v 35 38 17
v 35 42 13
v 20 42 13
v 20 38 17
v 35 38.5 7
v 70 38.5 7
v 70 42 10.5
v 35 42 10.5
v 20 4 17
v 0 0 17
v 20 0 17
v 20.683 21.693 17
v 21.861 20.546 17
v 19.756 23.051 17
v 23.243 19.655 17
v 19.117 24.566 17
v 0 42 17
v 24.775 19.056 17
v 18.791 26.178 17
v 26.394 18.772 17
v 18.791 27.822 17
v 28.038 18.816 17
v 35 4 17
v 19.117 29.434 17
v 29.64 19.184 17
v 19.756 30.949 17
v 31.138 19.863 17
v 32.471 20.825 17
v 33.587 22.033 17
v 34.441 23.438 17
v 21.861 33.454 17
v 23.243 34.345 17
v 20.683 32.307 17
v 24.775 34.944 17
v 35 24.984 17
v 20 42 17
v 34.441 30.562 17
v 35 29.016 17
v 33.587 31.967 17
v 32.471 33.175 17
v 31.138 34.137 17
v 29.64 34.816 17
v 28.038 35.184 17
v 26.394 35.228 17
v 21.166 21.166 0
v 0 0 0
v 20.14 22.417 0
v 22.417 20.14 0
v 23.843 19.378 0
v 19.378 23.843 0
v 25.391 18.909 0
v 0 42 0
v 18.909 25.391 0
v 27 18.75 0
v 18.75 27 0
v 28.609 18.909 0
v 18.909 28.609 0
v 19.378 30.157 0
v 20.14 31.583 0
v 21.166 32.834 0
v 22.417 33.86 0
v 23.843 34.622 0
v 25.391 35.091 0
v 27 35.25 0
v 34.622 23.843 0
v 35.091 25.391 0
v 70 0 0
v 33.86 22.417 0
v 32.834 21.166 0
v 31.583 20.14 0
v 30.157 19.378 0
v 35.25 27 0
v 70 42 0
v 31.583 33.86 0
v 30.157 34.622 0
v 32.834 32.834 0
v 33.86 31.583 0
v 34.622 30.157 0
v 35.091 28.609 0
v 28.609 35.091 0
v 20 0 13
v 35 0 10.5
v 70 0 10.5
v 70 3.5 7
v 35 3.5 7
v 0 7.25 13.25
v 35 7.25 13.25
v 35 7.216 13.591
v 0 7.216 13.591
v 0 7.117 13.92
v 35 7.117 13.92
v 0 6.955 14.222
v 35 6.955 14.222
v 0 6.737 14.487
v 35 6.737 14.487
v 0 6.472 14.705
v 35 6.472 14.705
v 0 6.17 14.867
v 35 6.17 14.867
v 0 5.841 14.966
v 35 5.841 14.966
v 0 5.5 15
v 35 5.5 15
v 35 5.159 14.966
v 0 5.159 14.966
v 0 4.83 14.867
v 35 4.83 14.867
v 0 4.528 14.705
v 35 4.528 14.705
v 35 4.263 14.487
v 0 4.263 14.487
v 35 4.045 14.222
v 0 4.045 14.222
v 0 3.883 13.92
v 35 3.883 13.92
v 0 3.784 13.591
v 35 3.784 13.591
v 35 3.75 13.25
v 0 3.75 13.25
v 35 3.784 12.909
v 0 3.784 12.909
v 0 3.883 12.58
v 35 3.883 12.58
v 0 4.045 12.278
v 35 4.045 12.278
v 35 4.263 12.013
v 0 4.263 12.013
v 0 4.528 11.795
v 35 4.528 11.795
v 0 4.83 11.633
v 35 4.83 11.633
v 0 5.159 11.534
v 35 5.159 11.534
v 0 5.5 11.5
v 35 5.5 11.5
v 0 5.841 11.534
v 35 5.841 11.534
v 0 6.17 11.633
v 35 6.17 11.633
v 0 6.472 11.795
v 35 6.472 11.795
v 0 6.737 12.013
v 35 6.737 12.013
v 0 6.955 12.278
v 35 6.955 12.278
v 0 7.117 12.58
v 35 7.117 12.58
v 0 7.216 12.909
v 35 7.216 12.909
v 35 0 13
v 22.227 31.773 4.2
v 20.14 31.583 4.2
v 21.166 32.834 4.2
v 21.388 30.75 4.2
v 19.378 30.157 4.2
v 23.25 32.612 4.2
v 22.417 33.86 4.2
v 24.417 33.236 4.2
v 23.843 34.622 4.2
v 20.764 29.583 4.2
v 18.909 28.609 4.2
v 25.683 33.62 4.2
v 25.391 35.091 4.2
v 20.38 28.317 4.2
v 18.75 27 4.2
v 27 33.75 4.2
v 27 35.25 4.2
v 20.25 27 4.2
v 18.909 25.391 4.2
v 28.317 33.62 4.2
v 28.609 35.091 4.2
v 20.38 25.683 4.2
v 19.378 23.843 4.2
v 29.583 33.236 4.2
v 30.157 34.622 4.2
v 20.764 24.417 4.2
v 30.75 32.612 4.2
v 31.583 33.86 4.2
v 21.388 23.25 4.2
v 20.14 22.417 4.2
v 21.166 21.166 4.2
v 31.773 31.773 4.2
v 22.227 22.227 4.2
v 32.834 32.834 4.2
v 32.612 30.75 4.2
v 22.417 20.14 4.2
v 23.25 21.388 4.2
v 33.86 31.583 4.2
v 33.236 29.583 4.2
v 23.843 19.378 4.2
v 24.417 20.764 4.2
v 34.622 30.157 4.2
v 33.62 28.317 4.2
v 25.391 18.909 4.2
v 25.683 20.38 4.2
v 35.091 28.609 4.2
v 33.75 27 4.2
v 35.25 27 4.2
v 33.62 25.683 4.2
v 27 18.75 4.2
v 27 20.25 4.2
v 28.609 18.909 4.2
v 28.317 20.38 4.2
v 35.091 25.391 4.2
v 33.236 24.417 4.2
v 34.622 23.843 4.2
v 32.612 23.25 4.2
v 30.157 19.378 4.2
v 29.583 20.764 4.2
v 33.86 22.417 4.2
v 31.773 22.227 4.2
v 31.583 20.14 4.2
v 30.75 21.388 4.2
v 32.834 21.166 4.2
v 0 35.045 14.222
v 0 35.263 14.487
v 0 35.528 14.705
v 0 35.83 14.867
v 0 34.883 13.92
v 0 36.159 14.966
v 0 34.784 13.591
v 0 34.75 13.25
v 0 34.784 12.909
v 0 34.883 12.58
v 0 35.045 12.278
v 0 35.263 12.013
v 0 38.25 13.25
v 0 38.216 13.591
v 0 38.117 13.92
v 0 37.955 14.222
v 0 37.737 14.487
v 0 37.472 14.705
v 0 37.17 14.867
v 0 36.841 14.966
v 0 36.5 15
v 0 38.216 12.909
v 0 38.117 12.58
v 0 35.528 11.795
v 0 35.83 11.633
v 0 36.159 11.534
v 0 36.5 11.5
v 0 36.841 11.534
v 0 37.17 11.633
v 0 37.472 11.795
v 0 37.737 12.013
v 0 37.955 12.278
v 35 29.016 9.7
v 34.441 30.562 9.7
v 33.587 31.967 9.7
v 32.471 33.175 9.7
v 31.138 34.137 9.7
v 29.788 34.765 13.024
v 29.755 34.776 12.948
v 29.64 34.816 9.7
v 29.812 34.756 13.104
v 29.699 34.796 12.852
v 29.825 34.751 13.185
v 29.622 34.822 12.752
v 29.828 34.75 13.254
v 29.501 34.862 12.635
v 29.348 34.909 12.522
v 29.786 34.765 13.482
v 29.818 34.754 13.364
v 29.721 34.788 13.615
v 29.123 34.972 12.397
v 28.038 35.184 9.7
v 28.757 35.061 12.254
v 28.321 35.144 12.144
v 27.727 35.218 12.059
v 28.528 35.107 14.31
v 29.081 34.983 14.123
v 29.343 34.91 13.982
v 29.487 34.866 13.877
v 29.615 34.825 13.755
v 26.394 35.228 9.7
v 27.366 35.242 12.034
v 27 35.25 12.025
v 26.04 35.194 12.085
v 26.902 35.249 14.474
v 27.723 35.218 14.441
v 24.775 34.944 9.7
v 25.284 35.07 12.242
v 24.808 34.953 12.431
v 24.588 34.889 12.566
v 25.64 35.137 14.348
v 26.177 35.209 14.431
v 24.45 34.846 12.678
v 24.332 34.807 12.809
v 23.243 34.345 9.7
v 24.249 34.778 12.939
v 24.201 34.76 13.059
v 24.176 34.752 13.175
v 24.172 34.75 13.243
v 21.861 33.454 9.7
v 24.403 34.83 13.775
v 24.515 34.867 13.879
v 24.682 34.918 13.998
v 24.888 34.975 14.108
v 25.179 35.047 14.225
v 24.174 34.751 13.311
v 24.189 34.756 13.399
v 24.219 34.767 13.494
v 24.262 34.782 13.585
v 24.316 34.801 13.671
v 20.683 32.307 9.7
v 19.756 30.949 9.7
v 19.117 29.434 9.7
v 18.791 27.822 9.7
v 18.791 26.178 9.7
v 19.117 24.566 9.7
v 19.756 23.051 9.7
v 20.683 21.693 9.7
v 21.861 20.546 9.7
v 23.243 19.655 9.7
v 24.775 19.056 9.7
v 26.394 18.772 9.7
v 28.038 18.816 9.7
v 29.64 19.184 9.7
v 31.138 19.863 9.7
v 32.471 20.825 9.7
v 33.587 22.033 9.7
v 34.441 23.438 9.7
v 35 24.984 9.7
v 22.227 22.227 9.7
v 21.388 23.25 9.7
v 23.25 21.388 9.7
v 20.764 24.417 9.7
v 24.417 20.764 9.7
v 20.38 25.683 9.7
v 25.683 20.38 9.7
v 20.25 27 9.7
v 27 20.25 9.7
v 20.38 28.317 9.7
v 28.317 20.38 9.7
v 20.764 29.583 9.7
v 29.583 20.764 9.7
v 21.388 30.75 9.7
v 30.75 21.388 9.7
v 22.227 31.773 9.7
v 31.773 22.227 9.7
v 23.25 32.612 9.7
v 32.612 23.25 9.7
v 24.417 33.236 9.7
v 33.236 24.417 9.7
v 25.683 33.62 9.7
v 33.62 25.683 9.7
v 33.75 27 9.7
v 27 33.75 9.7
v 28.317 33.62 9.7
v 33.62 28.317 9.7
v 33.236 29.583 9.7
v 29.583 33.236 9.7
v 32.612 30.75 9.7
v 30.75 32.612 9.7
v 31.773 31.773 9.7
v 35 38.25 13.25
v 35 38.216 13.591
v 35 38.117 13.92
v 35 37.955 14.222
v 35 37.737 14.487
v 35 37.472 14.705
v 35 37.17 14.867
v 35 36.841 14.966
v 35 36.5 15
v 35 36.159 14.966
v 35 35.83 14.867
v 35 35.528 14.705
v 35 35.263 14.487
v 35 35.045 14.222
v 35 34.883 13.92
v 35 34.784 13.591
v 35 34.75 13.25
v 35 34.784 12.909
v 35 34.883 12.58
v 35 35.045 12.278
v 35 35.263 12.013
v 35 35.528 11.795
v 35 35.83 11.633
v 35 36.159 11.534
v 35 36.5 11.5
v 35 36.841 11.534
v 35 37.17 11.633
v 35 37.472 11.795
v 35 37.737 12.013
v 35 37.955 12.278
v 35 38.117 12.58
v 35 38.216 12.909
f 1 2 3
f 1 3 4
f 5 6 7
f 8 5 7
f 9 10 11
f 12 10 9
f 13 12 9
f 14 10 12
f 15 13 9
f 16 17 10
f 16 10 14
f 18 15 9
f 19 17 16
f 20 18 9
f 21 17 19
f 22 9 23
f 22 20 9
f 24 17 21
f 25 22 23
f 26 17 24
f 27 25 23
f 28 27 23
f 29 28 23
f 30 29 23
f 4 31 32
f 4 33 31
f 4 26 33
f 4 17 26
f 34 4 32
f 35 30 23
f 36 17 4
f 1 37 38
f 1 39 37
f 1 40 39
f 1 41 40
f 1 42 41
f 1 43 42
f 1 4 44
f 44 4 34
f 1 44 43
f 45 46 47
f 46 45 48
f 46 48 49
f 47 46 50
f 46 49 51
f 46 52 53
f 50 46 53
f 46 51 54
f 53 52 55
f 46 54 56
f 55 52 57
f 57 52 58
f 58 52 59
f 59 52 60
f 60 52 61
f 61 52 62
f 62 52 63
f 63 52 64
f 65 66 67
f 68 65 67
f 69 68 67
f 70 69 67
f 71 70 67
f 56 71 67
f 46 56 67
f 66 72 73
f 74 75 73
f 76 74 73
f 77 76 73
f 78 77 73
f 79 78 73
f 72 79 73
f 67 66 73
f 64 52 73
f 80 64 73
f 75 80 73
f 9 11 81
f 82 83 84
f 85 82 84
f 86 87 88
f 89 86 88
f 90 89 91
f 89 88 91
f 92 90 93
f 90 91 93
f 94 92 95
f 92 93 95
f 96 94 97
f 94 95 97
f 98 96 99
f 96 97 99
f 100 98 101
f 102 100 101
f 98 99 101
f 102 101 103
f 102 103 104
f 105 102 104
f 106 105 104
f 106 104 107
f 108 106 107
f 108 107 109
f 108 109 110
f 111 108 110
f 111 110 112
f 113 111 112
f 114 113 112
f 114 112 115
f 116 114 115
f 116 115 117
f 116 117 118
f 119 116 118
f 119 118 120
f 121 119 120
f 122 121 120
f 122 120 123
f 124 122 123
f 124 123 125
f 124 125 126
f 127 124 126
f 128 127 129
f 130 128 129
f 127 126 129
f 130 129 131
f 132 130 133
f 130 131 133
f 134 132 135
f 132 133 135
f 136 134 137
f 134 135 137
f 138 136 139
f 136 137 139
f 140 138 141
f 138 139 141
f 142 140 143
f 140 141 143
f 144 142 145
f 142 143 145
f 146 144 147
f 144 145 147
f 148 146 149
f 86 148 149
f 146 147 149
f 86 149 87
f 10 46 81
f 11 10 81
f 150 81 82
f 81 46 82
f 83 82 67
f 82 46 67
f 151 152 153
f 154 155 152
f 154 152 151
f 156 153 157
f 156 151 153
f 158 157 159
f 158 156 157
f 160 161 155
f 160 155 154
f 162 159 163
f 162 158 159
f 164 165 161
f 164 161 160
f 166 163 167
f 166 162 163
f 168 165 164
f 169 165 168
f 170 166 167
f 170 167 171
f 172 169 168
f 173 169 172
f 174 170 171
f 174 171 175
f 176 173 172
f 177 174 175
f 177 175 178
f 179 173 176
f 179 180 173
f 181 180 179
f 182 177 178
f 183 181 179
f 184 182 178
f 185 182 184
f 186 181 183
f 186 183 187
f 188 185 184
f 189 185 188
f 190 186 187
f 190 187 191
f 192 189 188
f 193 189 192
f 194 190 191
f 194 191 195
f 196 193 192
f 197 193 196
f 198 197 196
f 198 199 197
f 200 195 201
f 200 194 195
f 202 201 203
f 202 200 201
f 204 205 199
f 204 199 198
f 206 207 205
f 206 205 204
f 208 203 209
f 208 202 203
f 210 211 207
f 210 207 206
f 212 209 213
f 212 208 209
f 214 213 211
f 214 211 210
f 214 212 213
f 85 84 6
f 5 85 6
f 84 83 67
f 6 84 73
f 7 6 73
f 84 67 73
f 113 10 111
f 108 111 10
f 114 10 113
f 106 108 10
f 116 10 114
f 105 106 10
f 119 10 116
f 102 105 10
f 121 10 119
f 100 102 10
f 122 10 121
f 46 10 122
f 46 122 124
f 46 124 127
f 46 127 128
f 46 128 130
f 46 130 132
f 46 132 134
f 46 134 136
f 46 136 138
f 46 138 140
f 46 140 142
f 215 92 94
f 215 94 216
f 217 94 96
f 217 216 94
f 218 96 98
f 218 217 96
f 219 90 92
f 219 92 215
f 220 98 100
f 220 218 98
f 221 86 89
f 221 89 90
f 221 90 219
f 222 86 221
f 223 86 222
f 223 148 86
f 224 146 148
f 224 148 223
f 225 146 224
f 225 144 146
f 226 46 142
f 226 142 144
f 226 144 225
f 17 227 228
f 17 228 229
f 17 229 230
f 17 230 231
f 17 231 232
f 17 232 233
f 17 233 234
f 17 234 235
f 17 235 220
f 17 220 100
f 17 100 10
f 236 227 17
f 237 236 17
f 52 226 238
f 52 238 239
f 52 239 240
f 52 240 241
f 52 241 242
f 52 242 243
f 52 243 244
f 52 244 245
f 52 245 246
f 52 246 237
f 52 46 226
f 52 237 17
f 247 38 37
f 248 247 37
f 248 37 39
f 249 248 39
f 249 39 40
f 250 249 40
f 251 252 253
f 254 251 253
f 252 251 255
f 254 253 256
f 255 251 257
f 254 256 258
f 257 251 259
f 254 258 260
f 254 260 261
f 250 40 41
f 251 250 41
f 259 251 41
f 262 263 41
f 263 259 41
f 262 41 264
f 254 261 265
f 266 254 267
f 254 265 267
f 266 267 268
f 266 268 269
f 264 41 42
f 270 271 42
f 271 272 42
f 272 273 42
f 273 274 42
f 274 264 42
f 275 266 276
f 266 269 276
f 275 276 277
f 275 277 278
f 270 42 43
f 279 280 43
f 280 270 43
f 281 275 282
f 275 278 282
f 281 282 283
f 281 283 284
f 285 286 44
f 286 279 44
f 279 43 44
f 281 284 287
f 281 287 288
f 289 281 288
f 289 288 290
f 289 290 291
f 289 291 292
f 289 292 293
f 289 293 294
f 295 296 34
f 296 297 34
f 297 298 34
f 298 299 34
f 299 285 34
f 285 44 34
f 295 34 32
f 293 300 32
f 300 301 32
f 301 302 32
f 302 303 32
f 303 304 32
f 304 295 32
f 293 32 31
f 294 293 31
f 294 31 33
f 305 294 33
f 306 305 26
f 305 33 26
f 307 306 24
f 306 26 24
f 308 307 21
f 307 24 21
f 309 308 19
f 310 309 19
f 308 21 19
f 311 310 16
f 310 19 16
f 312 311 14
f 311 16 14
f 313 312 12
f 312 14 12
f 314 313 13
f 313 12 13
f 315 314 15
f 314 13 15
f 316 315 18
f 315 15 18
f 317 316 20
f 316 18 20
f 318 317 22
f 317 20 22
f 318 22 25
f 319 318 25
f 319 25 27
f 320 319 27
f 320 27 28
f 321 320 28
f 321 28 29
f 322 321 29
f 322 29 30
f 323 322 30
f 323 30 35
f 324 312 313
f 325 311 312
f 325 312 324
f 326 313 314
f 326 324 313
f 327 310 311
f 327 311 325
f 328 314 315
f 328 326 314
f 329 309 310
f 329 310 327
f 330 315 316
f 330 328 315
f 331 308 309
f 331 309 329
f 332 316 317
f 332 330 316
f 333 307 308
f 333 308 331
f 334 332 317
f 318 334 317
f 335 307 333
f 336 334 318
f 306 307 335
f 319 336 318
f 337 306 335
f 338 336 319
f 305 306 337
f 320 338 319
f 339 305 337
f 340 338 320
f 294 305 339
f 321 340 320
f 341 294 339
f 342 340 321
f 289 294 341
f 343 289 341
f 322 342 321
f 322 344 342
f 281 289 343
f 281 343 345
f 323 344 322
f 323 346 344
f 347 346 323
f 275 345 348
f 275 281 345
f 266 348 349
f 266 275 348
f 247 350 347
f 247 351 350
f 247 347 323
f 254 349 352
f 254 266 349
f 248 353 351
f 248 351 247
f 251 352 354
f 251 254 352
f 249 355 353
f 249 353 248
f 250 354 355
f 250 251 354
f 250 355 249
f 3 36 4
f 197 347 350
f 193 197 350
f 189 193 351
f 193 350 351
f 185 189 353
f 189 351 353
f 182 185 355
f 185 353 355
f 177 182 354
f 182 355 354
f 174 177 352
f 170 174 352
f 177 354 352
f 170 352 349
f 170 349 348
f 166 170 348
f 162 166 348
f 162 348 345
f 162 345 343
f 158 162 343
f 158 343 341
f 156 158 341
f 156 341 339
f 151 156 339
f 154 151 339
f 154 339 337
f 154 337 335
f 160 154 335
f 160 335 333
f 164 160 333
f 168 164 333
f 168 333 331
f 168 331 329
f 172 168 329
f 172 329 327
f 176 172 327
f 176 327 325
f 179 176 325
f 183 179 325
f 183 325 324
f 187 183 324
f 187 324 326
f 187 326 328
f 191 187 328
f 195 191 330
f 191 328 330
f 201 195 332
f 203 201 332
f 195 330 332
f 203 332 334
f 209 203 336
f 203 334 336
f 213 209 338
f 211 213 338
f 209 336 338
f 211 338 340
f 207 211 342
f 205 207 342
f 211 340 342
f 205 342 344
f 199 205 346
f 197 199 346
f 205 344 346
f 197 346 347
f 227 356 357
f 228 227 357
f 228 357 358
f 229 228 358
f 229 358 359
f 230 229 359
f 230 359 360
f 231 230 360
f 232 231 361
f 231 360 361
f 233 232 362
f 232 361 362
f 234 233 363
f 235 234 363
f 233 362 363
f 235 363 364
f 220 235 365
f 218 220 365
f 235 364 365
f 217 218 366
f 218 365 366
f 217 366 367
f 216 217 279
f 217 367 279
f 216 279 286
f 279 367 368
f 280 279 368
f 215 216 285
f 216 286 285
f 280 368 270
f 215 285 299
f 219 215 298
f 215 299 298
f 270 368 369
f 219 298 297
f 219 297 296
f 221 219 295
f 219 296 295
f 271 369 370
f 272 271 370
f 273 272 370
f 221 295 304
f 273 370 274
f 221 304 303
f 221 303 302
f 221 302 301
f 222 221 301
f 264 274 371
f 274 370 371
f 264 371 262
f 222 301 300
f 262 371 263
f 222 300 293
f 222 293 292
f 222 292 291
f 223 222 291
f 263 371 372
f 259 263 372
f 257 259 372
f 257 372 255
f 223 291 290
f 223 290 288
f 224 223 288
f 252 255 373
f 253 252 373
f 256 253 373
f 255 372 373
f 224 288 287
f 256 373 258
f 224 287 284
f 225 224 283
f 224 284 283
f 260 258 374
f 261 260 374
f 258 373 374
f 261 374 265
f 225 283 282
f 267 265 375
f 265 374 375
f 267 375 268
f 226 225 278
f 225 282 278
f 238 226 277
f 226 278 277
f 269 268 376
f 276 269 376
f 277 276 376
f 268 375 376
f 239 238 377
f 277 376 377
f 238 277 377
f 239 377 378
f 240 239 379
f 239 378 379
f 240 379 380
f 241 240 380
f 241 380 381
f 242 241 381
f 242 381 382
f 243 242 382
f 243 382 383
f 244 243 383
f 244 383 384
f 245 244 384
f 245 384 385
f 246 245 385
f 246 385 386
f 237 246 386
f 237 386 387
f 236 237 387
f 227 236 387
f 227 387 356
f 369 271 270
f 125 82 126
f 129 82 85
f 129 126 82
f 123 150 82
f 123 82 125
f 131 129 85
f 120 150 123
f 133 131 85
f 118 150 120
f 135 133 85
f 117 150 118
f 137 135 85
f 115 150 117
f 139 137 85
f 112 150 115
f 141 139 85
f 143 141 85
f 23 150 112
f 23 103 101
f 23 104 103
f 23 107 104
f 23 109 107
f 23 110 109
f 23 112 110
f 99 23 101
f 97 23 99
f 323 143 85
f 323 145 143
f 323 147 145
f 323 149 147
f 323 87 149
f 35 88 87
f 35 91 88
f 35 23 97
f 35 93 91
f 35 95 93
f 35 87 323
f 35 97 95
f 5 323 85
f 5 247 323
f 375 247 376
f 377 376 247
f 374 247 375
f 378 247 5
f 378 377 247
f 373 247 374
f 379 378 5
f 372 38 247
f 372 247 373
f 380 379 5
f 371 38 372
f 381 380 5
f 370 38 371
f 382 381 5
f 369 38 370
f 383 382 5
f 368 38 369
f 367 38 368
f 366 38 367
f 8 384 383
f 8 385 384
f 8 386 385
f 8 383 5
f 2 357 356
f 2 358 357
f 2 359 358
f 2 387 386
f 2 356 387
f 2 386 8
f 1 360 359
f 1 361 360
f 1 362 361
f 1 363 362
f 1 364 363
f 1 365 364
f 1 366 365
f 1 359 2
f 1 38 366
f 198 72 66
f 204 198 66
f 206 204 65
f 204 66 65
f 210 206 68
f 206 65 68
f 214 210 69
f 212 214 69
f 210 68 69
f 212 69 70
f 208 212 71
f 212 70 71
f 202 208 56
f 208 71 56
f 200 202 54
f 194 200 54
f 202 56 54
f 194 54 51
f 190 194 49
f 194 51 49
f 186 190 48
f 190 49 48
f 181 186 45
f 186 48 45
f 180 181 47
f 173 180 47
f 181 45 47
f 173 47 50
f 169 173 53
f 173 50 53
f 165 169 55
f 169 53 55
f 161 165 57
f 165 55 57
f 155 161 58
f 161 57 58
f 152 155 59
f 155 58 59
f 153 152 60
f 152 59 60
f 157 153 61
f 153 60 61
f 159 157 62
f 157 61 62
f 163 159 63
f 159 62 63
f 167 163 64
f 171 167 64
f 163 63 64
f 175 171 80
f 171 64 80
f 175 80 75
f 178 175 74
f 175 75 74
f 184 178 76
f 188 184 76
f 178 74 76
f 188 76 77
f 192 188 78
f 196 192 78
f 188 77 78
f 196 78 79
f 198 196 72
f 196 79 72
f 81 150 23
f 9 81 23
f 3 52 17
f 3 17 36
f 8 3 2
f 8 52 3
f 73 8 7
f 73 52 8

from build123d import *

# Parameters (mm, degrees)
BOX_W           = 70
BOX_H           = 42
BOX_DEPTH       = 17
SKETCH_R        = 1.75
POCKET_DEPTH    = 70.001
POCKET001_DEPTH = 50
POCKET002_DEPTH = 35
SKETCH003_R     = 6.75
POCKET003_DEPTH = 17.001
SKETCH004_R     = 8.25
POCKET004_DEPTH = 7.3
SKETCH005_R     = 8.25
POCKET005_DEPTH = 4.2


with BuildPart() as part:
    # Box → Box (new body)
    with BuildSketch(Plane.XY):
        with Locations((35, 21)):
            Rectangle(BOX_W, BOX_H)
    extrude(amount=BOX_DEPTH)

    # Sketch (on Face2 of BaseFeature) → Pocket (cut, through all)
    with BuildSketch(Plane.YZ.offset(70)):
        with Locations((5.5, 13.25)):
            Circle(SKETCH_R)
        with Locations((36.5, 13.25)):
            Circle(SKETCH_R)
    extrude(amount=-POCKET_DEPTH, mode=Mode.SUBTRACT)

    # Sketch001 (on Face2 of BaseFeature) → Pocket001 (cut)
    with BuildSketch(Plane.YZ.offset(70)):
        Polygon((4, 17), (0, 17), (0, 13), align=None)
        Polygon((38, 17), (42, 17), (42, 13), align=None)
    extrude(amount=-POCKET001_DEPTH, mode=Mode.SUBTRACT)

    # Sketch002 (on Face8 of Pocket001) → Pocket002 (cut)
    with BuildSketch(Plane.YZ.offset(70)):
        Polygon((4, 17), (0, 13), (0, 10.5), (3.5, 7), (38.5, 7), (42, 10.5), (42, 13), (38, 17), align=None)
    extrude(amount=-POCKET002_DEPTH, mode=Mode.SUBTRACT)

    # Sketch003 (on Face3 of Pocket002) → Pocket003 (cut, through all)
    with BuildSketch(Plane.XY.offset(17)):
        with Locations((27, 27)):
            Circle(SKETCH003_R)
    extrude(amount=-POCKET003_DEPTH, mode=Mode.SUBTRACT)

    # Sketch004 (on Face3 of Pocket003) → Pocket004 (cut)
    with BuildSketch(Plane.XY.offset(17)):
        with Locations((27, 27)):
            Circle(SKETCH004_R)
    extrude(amount=-POCKET004_DEPTH, mode=Mode.SUBTRACT)

    # Sketch005 (on Face4 of Pocket004) → Pocket005 (cut)
    with BuildSketch(Plane(origin=(0, 0, 0), x_dir=(1, 0, 0), z_dir=(0, 0, -1))):
        with Locations((27, -27)):
            Circle(SKETCH005_R)
    extrude(amount=-POCKET005_DEPTH, mode=Mode.SUBTRACT)


solid = part.part
